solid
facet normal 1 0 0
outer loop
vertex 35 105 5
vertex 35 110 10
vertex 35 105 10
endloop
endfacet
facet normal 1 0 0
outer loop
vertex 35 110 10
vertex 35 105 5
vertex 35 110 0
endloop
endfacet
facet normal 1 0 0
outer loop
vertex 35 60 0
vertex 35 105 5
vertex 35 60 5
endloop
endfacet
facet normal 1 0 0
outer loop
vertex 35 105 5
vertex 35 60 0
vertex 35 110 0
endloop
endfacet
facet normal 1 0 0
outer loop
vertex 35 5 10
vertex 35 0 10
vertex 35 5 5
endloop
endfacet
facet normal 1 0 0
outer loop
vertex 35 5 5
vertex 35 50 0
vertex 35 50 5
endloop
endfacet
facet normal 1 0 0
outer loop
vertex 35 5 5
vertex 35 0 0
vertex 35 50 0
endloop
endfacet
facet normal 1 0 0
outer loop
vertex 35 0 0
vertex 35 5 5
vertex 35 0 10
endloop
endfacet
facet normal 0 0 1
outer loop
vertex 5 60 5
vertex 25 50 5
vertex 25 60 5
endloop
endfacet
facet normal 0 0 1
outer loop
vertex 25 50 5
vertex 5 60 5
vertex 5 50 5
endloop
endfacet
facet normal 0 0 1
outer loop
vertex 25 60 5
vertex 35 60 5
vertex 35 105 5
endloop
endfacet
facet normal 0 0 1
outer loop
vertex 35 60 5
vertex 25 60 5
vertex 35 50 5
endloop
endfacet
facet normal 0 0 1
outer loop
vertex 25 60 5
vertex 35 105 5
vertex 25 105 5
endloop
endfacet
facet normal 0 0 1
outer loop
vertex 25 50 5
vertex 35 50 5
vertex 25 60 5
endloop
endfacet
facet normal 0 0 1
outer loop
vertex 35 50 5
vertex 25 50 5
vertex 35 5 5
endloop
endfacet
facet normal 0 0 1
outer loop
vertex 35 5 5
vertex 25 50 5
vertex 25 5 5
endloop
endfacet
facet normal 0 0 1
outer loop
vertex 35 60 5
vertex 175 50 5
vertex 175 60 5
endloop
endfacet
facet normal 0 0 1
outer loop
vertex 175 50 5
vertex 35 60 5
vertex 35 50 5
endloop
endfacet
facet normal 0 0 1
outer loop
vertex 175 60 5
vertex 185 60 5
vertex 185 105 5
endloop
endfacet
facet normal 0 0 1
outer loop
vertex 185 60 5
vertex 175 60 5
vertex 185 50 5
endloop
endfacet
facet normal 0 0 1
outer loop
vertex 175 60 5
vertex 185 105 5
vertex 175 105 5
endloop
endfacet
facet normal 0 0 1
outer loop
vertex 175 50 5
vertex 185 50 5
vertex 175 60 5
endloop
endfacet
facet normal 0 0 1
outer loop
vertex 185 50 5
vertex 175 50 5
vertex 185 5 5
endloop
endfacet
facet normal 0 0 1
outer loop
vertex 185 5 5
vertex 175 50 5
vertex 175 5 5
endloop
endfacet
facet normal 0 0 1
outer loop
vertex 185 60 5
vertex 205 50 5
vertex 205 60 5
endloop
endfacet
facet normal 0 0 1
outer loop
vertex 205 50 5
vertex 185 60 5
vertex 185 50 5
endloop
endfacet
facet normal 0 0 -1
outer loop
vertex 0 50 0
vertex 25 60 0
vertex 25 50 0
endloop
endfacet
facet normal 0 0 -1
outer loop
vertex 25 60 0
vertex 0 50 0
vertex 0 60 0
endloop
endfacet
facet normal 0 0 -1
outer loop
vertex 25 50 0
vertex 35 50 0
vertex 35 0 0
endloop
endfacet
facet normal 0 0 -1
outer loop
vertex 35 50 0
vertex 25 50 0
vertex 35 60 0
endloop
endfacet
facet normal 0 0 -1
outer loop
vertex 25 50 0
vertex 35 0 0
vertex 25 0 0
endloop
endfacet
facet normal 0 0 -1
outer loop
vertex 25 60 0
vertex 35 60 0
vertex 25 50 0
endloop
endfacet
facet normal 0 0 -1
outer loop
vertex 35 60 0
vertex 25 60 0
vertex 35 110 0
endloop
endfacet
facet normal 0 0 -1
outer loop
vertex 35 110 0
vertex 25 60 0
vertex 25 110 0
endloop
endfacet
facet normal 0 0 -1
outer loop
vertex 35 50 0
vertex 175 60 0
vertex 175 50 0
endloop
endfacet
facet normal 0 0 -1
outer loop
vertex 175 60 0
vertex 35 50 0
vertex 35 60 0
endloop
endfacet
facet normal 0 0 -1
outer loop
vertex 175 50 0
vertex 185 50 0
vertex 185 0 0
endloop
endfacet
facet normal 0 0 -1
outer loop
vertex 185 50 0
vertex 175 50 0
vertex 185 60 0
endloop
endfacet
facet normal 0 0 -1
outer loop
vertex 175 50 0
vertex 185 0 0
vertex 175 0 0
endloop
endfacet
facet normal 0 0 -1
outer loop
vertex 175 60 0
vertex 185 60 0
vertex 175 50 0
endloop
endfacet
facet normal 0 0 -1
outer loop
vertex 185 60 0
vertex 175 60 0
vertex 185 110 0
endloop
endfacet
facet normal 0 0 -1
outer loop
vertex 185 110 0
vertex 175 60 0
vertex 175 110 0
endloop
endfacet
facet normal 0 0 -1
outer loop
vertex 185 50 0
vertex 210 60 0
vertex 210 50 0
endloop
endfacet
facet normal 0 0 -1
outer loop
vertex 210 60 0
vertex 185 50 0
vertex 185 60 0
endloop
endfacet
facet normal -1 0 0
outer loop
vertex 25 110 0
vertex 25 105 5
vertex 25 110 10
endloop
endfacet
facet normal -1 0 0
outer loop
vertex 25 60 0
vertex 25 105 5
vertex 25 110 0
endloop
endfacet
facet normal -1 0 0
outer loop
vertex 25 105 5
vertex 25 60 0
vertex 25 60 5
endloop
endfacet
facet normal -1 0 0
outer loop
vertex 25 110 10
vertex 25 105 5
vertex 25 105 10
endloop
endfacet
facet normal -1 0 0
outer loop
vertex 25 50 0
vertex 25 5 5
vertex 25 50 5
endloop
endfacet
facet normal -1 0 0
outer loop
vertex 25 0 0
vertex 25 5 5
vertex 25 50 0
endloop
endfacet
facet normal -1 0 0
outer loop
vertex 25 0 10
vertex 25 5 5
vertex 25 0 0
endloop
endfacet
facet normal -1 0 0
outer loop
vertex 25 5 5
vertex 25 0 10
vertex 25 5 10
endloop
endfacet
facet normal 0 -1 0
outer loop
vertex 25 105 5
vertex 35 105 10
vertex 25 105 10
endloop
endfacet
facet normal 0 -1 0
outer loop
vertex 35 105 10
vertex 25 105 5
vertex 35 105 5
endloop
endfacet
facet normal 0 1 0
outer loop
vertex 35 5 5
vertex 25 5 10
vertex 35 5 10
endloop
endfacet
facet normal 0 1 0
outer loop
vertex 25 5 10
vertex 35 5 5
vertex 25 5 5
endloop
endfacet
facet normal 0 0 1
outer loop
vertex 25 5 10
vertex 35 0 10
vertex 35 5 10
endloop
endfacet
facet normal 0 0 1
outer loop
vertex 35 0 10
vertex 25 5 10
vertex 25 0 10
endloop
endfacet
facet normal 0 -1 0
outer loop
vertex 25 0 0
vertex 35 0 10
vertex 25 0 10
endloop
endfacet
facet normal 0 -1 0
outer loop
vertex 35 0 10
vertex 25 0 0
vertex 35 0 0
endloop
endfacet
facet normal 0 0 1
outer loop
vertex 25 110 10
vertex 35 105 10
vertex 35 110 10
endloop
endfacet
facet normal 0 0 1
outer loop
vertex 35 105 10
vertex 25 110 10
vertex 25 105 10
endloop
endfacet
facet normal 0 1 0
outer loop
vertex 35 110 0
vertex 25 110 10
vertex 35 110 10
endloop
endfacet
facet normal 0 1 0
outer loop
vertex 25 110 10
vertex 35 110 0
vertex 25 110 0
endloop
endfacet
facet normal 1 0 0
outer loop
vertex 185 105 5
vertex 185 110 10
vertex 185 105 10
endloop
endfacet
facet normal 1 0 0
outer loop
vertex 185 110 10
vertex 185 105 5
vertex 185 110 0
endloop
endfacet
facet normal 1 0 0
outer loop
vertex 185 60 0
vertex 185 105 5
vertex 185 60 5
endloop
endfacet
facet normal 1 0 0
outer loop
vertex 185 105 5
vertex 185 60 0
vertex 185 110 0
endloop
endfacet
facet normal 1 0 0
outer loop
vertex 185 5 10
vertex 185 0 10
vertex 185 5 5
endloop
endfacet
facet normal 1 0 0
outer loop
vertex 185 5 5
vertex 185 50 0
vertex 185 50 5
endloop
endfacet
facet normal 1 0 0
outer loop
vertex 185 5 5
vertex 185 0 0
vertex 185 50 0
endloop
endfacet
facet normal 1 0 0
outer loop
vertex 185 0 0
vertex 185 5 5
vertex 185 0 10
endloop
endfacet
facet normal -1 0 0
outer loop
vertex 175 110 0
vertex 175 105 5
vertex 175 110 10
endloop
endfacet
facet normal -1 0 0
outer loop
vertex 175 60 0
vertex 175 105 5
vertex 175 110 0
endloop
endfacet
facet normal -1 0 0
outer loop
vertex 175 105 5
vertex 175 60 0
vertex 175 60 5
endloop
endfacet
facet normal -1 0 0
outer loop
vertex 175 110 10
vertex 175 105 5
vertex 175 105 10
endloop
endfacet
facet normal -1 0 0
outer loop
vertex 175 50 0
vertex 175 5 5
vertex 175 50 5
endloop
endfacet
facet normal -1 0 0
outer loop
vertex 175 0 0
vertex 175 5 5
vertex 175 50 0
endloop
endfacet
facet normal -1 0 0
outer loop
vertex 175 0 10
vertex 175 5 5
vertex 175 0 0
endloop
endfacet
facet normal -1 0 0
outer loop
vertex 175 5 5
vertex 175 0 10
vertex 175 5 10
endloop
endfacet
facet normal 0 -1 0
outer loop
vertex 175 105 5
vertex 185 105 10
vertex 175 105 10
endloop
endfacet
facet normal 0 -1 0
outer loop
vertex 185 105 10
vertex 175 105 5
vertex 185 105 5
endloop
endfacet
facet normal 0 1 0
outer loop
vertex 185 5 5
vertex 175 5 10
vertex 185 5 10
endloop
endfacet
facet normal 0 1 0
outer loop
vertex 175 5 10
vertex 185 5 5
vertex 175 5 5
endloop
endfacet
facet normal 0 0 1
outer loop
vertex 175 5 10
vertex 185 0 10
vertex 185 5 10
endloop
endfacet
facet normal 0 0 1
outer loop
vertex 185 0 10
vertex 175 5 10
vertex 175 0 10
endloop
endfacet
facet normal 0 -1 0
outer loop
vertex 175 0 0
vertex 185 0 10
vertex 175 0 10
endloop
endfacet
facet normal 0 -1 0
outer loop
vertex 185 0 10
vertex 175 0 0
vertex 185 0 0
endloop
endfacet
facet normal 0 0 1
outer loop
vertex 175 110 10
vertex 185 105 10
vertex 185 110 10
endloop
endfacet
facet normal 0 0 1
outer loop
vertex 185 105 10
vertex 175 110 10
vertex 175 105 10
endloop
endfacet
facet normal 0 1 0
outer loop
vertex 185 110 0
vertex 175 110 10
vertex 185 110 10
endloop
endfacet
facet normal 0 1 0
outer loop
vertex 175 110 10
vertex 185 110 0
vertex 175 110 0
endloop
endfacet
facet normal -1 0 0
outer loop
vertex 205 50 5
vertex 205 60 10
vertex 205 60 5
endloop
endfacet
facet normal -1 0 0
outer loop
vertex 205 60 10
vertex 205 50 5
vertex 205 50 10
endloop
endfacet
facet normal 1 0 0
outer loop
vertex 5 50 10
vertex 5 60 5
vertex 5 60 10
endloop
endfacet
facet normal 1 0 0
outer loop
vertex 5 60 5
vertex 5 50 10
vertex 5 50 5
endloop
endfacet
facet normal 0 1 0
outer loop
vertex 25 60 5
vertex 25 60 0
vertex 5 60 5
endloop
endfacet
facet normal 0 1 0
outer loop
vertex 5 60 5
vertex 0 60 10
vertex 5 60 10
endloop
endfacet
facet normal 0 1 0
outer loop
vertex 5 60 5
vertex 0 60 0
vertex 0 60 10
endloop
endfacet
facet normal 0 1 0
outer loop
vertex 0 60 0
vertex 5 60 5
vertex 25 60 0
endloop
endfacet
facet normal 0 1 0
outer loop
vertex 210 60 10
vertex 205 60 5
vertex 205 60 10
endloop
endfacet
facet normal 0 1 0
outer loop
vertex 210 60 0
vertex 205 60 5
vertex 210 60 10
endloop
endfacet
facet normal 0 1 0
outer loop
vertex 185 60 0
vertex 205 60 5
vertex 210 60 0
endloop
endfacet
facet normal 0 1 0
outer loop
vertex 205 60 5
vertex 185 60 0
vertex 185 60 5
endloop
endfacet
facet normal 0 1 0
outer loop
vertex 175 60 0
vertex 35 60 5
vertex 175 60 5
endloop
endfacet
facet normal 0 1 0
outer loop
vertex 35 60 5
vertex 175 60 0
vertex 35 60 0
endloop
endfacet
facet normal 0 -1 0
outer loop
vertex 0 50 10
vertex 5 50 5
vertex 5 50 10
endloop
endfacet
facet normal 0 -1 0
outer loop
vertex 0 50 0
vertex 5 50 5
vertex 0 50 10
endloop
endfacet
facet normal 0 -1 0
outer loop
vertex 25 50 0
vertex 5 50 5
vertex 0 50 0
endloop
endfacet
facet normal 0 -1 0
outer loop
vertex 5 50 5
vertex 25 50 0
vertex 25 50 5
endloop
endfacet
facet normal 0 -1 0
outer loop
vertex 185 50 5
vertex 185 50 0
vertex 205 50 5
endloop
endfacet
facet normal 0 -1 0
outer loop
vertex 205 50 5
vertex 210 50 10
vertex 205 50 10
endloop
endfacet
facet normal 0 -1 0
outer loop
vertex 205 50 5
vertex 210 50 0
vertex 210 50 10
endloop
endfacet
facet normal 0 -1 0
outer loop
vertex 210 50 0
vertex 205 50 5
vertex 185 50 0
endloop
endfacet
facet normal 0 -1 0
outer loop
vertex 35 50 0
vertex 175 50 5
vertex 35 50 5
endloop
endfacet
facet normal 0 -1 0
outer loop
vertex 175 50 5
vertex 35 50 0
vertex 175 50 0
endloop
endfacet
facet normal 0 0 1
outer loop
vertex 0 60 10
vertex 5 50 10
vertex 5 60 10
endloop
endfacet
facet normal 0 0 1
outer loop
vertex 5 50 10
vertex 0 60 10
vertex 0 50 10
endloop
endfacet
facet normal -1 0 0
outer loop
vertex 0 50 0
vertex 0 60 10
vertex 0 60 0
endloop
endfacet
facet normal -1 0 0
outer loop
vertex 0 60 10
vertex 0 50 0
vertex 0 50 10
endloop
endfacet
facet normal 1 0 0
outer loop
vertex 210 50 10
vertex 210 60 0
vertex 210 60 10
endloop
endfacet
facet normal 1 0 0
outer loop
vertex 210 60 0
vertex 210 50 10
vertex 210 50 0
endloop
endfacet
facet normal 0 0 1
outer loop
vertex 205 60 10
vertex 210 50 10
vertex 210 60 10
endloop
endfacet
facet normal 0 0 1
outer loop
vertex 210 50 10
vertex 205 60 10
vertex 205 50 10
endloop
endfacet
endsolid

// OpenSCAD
$fa = 1;
$fs = 1.75 / 2;

switch_width = 200;
switch_depth = 100;

thickness = 5;

union() {
    translate([thickness, switch_depth / 2])
    cube([switch_width, thickness * 2, thickness]);

    translate([0, switch_depth / 2])
    cube([thickness, thickness * 2, thickness * 2]);

    translate([switch_width + thickness, switch_depth / 2])
    cube([thickness, thickness * 2, thickness * 2]);

    translate([thickness + 20, 0, 0]) {
        translate([0, thickness, 0])
        cube([thickness * 2, switch_depth, thickness]);

        cube([thickness * 2, thickness, thickness * 2]);

        translate([0, switch_depth + thickness, 0])
        cube([thickness * 2, thickness, thickness * 2]);
    }

    translate([switch_width - thickness - 20, 0, 0]) {
        translate([0, thickness, 0])
        cube([thickness * 2, switch_depth, thickness]);

        cube([thickness * 2, thickness, thickness * 2]);

        translate([0, switch_depth + thickness, 0])
        cube([thickness * 2, thickness, thickness * 2]);
    }
}
